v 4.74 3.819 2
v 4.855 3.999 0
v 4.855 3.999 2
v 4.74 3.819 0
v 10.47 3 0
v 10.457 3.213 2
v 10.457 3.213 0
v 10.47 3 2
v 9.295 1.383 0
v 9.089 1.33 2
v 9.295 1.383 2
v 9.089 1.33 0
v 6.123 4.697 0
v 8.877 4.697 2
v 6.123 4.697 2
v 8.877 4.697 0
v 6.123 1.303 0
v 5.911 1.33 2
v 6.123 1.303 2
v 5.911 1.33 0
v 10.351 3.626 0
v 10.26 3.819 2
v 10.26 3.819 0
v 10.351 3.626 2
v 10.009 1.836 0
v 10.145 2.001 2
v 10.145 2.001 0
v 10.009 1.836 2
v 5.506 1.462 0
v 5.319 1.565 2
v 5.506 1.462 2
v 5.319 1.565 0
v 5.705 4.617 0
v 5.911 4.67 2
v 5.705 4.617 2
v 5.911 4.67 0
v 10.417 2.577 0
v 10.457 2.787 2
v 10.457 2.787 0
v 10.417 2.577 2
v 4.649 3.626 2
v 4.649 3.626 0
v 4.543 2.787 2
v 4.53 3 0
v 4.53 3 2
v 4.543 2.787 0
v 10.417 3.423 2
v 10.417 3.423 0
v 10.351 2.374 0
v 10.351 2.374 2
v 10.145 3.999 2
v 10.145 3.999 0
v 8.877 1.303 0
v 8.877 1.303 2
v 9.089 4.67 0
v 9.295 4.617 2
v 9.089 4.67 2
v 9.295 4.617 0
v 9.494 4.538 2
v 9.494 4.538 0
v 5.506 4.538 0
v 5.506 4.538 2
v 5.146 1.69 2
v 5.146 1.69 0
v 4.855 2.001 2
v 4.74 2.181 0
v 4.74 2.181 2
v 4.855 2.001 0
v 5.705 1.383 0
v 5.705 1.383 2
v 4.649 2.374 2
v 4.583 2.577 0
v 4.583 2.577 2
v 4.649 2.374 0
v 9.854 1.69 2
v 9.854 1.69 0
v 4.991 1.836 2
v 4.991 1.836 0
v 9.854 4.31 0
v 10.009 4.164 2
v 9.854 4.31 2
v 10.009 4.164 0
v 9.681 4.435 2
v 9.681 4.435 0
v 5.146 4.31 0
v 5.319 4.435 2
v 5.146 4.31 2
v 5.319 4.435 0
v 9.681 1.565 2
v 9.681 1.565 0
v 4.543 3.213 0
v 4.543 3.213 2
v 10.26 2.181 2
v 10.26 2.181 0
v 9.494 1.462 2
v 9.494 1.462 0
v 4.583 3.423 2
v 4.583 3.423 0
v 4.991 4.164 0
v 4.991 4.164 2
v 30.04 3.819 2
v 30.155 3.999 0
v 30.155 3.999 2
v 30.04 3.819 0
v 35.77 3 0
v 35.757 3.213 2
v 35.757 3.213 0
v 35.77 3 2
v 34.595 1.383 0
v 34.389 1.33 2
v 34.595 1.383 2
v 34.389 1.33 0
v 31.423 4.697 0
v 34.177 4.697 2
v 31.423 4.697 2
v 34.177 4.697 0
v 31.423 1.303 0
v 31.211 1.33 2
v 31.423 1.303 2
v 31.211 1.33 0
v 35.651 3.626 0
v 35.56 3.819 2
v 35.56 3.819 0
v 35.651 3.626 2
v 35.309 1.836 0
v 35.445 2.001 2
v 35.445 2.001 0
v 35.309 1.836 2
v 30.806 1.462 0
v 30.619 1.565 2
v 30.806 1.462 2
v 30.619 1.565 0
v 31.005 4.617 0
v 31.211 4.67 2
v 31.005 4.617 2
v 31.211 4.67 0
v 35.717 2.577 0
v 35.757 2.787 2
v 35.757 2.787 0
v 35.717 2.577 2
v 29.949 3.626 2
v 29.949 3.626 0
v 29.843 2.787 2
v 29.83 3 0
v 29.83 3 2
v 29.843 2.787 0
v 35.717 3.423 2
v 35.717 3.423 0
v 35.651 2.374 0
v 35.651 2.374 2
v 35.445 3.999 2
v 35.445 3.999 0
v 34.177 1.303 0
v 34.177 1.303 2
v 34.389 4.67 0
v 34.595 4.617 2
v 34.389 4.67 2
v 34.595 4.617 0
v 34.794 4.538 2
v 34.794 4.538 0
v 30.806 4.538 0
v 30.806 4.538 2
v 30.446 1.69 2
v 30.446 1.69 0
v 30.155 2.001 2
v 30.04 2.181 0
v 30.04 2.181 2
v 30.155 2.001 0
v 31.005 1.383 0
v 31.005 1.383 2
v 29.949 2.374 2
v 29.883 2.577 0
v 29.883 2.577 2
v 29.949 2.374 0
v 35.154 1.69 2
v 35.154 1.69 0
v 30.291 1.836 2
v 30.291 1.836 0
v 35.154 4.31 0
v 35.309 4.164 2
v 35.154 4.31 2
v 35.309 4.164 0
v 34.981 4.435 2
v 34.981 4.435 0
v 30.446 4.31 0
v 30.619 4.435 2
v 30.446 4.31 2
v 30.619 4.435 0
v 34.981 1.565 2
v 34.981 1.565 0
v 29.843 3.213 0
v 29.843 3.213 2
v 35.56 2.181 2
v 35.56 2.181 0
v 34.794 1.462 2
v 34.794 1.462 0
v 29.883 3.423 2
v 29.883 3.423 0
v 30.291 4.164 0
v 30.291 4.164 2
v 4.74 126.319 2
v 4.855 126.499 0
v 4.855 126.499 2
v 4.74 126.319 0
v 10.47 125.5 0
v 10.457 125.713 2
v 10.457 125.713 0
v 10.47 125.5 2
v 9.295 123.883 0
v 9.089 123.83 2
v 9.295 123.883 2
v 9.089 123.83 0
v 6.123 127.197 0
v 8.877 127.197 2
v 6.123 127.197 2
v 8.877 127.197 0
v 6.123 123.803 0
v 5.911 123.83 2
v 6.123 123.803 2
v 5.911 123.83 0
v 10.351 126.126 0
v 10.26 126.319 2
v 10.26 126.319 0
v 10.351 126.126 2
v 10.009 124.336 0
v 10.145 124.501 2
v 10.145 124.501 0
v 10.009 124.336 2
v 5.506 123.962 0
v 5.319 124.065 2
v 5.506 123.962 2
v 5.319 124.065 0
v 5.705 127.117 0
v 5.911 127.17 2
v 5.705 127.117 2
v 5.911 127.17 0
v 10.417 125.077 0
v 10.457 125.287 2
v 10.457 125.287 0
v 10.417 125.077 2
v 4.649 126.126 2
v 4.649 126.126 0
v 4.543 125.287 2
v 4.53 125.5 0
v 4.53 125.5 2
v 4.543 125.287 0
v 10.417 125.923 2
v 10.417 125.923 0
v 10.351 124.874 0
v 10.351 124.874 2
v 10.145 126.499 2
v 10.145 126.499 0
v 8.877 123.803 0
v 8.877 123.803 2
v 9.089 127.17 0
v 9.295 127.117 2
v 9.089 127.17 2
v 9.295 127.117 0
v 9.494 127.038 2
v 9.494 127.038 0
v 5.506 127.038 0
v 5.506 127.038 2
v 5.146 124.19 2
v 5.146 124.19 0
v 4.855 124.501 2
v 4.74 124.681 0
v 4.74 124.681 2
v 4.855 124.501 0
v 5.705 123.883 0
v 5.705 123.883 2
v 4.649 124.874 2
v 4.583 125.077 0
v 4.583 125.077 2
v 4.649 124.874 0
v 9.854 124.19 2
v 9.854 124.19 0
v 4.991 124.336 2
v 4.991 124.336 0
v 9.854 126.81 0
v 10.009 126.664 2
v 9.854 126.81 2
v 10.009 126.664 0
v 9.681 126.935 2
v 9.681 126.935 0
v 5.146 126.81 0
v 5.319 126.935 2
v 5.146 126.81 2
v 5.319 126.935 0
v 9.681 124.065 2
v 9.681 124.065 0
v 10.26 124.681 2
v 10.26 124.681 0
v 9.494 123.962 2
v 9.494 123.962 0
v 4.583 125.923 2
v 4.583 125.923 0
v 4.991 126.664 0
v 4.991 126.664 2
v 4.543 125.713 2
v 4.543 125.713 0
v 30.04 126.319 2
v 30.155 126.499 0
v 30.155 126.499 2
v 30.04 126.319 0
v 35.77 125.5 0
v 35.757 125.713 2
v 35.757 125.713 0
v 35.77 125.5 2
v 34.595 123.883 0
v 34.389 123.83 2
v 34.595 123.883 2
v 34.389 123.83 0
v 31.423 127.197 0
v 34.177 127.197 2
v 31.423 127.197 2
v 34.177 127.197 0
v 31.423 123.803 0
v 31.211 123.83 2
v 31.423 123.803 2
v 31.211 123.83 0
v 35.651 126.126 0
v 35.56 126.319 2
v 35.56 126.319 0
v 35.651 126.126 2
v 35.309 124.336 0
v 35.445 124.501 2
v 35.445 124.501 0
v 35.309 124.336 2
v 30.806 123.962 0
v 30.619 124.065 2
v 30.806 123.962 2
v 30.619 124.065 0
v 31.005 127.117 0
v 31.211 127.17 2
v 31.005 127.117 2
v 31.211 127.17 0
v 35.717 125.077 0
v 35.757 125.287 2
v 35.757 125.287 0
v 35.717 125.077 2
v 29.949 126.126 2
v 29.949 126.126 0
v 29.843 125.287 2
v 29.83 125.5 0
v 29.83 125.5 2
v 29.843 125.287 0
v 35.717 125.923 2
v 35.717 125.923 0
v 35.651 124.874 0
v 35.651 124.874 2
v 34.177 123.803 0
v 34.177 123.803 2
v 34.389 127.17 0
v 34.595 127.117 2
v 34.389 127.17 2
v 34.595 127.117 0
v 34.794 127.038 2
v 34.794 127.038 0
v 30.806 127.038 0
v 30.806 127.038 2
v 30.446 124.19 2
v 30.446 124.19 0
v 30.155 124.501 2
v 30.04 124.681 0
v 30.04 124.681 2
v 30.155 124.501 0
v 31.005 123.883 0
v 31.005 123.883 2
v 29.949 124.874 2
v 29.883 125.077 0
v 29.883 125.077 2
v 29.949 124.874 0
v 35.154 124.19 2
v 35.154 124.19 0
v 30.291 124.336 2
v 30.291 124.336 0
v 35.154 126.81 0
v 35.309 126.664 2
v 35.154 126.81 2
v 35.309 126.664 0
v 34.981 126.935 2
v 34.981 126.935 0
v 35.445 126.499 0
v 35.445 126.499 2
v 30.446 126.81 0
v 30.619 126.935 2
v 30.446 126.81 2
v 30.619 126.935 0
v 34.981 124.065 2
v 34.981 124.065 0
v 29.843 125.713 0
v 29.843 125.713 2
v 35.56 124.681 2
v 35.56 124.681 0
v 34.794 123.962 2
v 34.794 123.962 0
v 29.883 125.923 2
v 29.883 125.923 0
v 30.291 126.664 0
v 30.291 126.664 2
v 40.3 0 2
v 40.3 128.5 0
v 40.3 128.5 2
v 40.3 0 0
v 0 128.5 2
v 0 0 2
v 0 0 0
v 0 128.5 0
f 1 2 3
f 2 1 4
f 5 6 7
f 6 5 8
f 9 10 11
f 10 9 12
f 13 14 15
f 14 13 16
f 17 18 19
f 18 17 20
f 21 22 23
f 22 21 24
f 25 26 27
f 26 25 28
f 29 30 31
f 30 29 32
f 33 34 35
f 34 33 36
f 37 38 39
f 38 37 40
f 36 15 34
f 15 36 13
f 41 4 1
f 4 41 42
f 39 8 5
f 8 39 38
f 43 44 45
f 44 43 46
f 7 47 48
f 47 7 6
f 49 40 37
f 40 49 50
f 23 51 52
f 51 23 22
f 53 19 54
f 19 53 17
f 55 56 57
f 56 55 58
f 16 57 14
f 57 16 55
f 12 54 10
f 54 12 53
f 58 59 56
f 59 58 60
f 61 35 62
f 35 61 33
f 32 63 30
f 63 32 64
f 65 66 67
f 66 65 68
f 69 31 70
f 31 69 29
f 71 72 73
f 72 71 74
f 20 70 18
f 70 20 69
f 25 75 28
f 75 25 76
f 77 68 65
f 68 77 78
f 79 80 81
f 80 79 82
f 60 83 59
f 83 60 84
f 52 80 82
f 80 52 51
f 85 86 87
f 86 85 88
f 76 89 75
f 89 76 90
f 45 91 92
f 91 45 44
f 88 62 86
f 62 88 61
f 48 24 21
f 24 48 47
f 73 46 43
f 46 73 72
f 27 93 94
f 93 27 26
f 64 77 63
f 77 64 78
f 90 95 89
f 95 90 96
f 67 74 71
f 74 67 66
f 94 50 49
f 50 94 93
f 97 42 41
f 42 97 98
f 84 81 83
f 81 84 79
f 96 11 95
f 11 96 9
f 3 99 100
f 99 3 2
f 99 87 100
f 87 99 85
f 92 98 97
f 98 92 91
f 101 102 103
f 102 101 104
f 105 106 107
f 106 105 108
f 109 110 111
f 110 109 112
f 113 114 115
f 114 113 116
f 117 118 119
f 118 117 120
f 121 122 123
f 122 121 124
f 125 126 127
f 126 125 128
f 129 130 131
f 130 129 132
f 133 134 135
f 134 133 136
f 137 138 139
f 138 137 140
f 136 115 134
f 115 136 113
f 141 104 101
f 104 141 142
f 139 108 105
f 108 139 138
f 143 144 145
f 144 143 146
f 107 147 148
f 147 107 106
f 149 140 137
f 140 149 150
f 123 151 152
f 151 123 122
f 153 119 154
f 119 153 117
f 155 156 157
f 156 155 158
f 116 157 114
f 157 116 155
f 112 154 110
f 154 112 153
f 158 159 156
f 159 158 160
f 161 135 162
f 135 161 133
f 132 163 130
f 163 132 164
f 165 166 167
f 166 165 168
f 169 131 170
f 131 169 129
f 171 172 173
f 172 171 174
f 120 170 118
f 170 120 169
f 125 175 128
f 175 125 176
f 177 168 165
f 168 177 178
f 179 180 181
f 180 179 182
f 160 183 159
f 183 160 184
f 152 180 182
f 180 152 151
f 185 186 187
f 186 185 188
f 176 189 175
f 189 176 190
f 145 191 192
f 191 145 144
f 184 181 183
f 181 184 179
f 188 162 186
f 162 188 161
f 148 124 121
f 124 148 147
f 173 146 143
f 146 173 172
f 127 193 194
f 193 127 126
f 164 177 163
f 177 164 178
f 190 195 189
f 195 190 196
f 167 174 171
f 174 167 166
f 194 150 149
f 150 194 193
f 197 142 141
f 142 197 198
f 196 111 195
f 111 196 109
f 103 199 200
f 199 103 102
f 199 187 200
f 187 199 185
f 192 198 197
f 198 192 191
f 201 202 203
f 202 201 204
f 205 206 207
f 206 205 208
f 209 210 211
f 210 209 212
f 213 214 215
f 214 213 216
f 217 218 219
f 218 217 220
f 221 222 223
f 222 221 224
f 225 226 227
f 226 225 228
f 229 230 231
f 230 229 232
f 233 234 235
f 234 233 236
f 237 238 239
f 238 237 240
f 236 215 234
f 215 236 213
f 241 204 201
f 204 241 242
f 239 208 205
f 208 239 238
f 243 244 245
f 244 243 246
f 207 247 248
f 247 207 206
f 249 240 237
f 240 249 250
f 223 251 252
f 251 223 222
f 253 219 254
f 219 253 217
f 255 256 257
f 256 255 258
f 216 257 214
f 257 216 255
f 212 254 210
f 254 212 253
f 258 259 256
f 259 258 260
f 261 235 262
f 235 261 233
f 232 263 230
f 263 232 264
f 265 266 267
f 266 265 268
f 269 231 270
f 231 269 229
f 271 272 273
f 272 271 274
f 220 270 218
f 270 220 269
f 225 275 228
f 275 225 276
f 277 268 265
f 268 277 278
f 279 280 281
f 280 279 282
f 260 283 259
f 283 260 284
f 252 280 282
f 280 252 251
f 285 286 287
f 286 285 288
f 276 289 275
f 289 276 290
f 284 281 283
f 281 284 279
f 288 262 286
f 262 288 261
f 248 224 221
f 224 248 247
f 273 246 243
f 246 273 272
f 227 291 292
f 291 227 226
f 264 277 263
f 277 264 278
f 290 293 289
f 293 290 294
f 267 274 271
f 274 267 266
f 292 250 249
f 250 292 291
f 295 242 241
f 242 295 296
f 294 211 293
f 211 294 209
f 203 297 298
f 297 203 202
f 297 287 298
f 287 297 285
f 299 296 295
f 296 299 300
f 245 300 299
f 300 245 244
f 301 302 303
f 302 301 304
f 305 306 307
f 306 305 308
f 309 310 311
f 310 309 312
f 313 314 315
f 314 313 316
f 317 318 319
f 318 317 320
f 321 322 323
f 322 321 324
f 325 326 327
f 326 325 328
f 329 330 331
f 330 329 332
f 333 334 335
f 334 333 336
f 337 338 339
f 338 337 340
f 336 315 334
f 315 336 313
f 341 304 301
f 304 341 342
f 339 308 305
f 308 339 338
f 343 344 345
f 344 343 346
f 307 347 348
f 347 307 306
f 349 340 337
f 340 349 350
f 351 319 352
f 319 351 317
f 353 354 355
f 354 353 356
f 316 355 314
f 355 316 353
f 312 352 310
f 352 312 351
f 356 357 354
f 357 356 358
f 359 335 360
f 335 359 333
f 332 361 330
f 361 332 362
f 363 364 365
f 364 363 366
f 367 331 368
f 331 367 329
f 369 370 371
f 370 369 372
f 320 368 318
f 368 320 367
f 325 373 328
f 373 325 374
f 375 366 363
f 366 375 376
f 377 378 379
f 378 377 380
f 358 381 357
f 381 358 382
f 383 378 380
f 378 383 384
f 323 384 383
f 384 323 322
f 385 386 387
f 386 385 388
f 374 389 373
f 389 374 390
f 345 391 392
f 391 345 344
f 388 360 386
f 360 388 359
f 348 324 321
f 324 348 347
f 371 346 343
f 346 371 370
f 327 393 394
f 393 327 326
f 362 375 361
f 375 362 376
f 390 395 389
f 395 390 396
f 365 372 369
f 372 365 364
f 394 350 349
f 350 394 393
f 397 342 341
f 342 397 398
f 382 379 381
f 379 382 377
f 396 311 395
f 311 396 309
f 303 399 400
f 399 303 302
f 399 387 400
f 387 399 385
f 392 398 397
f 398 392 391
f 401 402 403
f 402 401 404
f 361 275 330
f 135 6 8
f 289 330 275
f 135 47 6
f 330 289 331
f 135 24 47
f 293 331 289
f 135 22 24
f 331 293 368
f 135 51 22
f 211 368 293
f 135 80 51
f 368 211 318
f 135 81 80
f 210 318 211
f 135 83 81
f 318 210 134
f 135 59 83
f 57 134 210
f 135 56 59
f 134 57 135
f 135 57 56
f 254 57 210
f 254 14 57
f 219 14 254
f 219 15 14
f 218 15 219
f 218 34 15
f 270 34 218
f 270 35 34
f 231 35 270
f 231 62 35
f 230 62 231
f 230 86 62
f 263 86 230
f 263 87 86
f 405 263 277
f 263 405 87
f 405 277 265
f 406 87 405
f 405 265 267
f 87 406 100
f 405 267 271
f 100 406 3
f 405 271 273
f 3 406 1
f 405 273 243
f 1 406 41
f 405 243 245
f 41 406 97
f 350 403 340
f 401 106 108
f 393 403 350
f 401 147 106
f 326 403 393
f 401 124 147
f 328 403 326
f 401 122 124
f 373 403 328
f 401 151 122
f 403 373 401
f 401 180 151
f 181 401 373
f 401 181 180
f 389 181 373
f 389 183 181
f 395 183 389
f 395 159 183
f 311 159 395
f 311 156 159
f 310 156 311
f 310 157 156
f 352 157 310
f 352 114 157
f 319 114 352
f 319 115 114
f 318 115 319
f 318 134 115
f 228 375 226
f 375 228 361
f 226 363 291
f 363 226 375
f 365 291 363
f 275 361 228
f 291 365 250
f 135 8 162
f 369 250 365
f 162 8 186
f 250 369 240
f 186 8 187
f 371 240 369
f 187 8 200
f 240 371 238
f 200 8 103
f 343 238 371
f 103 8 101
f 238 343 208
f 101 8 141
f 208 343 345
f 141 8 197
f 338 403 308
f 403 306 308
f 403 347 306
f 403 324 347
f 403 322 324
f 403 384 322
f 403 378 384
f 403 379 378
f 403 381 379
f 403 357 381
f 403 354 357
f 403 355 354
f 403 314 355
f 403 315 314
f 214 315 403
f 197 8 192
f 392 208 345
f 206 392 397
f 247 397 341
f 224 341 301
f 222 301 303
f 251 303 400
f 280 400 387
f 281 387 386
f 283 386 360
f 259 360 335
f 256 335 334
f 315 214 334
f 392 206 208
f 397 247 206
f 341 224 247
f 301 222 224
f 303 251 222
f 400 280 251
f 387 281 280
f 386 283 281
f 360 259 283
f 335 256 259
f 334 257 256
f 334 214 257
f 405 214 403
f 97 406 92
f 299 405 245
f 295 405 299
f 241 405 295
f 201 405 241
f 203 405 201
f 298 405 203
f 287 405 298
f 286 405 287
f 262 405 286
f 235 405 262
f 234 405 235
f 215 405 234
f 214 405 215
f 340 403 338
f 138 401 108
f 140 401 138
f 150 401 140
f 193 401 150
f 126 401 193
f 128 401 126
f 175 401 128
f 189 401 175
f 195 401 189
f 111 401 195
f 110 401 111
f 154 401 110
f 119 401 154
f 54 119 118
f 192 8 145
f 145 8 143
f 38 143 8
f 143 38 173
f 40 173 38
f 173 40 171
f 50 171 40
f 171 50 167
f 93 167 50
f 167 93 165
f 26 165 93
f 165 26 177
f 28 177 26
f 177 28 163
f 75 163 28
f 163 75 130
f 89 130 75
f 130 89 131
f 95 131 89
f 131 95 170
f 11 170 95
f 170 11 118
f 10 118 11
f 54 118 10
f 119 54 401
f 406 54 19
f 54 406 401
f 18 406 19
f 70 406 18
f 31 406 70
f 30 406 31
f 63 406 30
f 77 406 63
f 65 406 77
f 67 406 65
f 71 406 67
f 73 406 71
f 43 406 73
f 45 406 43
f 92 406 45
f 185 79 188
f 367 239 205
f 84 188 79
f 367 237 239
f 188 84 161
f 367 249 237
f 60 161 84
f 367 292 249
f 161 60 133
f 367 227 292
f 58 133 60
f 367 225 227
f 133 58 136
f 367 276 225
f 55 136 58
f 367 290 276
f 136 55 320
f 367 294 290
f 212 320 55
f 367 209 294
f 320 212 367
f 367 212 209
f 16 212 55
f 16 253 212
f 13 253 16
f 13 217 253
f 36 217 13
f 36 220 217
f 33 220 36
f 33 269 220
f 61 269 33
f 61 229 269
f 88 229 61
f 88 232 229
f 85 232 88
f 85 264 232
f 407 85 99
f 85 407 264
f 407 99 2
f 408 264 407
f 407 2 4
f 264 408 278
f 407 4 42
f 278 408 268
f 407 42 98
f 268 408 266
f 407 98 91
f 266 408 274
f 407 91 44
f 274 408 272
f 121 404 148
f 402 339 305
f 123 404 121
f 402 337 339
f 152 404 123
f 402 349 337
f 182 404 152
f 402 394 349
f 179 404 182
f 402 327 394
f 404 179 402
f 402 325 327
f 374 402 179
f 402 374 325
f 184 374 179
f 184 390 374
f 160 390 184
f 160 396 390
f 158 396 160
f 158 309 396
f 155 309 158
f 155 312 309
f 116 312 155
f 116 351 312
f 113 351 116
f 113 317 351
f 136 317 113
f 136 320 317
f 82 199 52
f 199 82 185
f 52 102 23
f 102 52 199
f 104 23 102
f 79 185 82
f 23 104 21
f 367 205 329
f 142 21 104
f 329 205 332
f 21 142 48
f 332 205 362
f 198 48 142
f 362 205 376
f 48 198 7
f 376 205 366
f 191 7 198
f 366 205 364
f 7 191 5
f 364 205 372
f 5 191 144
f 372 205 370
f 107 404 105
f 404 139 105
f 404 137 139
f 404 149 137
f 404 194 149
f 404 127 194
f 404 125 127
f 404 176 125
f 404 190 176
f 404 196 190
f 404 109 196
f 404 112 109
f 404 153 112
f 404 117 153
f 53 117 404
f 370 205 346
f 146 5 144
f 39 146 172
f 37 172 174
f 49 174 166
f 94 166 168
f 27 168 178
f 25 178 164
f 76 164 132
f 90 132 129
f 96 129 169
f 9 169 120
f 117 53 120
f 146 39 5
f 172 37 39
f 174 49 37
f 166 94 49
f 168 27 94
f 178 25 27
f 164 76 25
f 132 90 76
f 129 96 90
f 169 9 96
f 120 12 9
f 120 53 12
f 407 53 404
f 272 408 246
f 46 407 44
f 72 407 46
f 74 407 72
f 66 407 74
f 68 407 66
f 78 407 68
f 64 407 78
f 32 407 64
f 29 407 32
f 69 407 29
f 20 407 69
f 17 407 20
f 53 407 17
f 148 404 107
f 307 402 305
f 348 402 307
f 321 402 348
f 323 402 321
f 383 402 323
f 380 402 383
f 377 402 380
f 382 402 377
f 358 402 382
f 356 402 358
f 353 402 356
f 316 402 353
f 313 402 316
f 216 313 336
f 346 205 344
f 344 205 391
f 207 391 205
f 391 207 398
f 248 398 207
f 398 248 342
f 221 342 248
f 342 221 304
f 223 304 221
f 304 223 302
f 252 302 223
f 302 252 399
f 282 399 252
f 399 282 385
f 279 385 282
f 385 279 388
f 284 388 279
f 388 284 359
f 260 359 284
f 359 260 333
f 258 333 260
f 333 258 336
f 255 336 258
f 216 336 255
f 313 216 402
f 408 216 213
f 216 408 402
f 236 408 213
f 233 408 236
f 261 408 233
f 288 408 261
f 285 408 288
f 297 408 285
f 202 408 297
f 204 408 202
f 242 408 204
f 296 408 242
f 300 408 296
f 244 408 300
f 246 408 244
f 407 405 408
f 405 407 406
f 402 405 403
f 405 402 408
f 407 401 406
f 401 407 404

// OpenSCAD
// Module width according to Doepfer standard up to 42 HP https://doepfer.de/a100_man/a100m_d.htm
// Module height 1U according to Intellijel https://intellijel.com/support/1u-technical-specifications/

/* [ Eurorack Settings ] */
// Width of the module in HP (Horizontal Pitch)
module_hp = 8; // [1, 1.5, 2, 4, 6, 8, 10, 12, 14, 16, 18, 20, 21, 22, 24, 28, 42, 84]
// Height of the module in U (Rack Units)
module_u = 3; // [3, 1]

// Height lookup table: [U, Height in mm]
eurorack_u_data = [
    [3, 128.5],
    [1, 39.65]
];

// Width lookup table: [HP, Rounded Width in mm]
eurorack_data = [
    [1,    5.0],
    [1.5,  7.5],
    [2,    9.8],
    [4,    20.0],
    [6,    30.0],
    [8,    40.3],
    [10,   50.5],
    [12,   60.6],
    [14,   70.8],
    [16,   80.9],
    [18,   91.3],
    [20,   101.3],
    [21,   106.3],
    [22,   111.4],
    [24,   121.9],
    [28,   141.9],
    [42,   213.0],
    [84,   426.7]
];

/* [ Slot/Panel Settings ] */
// Slot rounding diameter
slot_width = 3.4;
// Total length excluding rounded ends
slot_length = 2.54;
// Horizontal offset from side for multi-slot configurations
margin_x = 7.5;
// Standard vertical offset for Eurorack screws
margin_y = 3.0;
// Material thickness
panel_thickness = 2.0;

// Functions for dimension lookups
function get_eurorack_width(hp) = lookup(hp, eurorack_data);
function get_eurorack_height(u) = lookup(u, eurorack_u_data);

// Calculate current dimensions
current_width = get_eurorack_width(module_hp);
current_height = get_eurorack_height(module_u);

// Module for a single mounting slot
module slot(x, y) {
    translate([x, y, 0]) {
        hull() {
            translate([-(slot_length/2), 0, 0])
                cylinder(d = slot_width, h = panel_thickness + 5, center = true, $fn = 50);
            
            translate([(slot_length/2), 0, 0])
                cylinder(d = slot_width, h = panel_thickness + 5, center = true, $fn = 50);
        }
    }
}

// Main module for the front panel with conditional slot placement
module front_panel_with_slots() {
    
    difference() {
        // Base plate
        cube([current_width, current_height, panel_thickness]);
        
        // Subtract slots based on module width
        if (module_hp <= 2) {
            // Single slot top and bottom (centered horizontally)
            slot(current_width / 2, margin_y);
            slot(current_width / 2, current_height - margin_y);
        }
        else if (module_hp <= 4) {
            // Single slot top and bottom (aligned to margin_x)
            slot(margin_x, margin_y);
            slot(margin_x, current_height - margin_y);
        }
        else {
            // Two slots top and bottom with specified horizontal margin
            // Bottom edge
            slot(margin_x, margin_y);
            slot(current_width - margin_x, margin_y);
            
            // Top edge
            slot(margin_x, current_height - margin_y);
            slot(current_width - margin_x, current_height - margin_y);
        }
    }
}

// Render the front panel
front_panel_with_slots();

// Console output for verification
echo(str("Module HP: ", module_hp));
echo(str("Module U: ", module_u));
echo(str("Calculated Width: ", current_width, " mm"));
echo(str("Calculated Height: ", current_height, " mm"));
echo(str("Slots per edge: ", (module_hp <= 4 ? "1" : "2")));
